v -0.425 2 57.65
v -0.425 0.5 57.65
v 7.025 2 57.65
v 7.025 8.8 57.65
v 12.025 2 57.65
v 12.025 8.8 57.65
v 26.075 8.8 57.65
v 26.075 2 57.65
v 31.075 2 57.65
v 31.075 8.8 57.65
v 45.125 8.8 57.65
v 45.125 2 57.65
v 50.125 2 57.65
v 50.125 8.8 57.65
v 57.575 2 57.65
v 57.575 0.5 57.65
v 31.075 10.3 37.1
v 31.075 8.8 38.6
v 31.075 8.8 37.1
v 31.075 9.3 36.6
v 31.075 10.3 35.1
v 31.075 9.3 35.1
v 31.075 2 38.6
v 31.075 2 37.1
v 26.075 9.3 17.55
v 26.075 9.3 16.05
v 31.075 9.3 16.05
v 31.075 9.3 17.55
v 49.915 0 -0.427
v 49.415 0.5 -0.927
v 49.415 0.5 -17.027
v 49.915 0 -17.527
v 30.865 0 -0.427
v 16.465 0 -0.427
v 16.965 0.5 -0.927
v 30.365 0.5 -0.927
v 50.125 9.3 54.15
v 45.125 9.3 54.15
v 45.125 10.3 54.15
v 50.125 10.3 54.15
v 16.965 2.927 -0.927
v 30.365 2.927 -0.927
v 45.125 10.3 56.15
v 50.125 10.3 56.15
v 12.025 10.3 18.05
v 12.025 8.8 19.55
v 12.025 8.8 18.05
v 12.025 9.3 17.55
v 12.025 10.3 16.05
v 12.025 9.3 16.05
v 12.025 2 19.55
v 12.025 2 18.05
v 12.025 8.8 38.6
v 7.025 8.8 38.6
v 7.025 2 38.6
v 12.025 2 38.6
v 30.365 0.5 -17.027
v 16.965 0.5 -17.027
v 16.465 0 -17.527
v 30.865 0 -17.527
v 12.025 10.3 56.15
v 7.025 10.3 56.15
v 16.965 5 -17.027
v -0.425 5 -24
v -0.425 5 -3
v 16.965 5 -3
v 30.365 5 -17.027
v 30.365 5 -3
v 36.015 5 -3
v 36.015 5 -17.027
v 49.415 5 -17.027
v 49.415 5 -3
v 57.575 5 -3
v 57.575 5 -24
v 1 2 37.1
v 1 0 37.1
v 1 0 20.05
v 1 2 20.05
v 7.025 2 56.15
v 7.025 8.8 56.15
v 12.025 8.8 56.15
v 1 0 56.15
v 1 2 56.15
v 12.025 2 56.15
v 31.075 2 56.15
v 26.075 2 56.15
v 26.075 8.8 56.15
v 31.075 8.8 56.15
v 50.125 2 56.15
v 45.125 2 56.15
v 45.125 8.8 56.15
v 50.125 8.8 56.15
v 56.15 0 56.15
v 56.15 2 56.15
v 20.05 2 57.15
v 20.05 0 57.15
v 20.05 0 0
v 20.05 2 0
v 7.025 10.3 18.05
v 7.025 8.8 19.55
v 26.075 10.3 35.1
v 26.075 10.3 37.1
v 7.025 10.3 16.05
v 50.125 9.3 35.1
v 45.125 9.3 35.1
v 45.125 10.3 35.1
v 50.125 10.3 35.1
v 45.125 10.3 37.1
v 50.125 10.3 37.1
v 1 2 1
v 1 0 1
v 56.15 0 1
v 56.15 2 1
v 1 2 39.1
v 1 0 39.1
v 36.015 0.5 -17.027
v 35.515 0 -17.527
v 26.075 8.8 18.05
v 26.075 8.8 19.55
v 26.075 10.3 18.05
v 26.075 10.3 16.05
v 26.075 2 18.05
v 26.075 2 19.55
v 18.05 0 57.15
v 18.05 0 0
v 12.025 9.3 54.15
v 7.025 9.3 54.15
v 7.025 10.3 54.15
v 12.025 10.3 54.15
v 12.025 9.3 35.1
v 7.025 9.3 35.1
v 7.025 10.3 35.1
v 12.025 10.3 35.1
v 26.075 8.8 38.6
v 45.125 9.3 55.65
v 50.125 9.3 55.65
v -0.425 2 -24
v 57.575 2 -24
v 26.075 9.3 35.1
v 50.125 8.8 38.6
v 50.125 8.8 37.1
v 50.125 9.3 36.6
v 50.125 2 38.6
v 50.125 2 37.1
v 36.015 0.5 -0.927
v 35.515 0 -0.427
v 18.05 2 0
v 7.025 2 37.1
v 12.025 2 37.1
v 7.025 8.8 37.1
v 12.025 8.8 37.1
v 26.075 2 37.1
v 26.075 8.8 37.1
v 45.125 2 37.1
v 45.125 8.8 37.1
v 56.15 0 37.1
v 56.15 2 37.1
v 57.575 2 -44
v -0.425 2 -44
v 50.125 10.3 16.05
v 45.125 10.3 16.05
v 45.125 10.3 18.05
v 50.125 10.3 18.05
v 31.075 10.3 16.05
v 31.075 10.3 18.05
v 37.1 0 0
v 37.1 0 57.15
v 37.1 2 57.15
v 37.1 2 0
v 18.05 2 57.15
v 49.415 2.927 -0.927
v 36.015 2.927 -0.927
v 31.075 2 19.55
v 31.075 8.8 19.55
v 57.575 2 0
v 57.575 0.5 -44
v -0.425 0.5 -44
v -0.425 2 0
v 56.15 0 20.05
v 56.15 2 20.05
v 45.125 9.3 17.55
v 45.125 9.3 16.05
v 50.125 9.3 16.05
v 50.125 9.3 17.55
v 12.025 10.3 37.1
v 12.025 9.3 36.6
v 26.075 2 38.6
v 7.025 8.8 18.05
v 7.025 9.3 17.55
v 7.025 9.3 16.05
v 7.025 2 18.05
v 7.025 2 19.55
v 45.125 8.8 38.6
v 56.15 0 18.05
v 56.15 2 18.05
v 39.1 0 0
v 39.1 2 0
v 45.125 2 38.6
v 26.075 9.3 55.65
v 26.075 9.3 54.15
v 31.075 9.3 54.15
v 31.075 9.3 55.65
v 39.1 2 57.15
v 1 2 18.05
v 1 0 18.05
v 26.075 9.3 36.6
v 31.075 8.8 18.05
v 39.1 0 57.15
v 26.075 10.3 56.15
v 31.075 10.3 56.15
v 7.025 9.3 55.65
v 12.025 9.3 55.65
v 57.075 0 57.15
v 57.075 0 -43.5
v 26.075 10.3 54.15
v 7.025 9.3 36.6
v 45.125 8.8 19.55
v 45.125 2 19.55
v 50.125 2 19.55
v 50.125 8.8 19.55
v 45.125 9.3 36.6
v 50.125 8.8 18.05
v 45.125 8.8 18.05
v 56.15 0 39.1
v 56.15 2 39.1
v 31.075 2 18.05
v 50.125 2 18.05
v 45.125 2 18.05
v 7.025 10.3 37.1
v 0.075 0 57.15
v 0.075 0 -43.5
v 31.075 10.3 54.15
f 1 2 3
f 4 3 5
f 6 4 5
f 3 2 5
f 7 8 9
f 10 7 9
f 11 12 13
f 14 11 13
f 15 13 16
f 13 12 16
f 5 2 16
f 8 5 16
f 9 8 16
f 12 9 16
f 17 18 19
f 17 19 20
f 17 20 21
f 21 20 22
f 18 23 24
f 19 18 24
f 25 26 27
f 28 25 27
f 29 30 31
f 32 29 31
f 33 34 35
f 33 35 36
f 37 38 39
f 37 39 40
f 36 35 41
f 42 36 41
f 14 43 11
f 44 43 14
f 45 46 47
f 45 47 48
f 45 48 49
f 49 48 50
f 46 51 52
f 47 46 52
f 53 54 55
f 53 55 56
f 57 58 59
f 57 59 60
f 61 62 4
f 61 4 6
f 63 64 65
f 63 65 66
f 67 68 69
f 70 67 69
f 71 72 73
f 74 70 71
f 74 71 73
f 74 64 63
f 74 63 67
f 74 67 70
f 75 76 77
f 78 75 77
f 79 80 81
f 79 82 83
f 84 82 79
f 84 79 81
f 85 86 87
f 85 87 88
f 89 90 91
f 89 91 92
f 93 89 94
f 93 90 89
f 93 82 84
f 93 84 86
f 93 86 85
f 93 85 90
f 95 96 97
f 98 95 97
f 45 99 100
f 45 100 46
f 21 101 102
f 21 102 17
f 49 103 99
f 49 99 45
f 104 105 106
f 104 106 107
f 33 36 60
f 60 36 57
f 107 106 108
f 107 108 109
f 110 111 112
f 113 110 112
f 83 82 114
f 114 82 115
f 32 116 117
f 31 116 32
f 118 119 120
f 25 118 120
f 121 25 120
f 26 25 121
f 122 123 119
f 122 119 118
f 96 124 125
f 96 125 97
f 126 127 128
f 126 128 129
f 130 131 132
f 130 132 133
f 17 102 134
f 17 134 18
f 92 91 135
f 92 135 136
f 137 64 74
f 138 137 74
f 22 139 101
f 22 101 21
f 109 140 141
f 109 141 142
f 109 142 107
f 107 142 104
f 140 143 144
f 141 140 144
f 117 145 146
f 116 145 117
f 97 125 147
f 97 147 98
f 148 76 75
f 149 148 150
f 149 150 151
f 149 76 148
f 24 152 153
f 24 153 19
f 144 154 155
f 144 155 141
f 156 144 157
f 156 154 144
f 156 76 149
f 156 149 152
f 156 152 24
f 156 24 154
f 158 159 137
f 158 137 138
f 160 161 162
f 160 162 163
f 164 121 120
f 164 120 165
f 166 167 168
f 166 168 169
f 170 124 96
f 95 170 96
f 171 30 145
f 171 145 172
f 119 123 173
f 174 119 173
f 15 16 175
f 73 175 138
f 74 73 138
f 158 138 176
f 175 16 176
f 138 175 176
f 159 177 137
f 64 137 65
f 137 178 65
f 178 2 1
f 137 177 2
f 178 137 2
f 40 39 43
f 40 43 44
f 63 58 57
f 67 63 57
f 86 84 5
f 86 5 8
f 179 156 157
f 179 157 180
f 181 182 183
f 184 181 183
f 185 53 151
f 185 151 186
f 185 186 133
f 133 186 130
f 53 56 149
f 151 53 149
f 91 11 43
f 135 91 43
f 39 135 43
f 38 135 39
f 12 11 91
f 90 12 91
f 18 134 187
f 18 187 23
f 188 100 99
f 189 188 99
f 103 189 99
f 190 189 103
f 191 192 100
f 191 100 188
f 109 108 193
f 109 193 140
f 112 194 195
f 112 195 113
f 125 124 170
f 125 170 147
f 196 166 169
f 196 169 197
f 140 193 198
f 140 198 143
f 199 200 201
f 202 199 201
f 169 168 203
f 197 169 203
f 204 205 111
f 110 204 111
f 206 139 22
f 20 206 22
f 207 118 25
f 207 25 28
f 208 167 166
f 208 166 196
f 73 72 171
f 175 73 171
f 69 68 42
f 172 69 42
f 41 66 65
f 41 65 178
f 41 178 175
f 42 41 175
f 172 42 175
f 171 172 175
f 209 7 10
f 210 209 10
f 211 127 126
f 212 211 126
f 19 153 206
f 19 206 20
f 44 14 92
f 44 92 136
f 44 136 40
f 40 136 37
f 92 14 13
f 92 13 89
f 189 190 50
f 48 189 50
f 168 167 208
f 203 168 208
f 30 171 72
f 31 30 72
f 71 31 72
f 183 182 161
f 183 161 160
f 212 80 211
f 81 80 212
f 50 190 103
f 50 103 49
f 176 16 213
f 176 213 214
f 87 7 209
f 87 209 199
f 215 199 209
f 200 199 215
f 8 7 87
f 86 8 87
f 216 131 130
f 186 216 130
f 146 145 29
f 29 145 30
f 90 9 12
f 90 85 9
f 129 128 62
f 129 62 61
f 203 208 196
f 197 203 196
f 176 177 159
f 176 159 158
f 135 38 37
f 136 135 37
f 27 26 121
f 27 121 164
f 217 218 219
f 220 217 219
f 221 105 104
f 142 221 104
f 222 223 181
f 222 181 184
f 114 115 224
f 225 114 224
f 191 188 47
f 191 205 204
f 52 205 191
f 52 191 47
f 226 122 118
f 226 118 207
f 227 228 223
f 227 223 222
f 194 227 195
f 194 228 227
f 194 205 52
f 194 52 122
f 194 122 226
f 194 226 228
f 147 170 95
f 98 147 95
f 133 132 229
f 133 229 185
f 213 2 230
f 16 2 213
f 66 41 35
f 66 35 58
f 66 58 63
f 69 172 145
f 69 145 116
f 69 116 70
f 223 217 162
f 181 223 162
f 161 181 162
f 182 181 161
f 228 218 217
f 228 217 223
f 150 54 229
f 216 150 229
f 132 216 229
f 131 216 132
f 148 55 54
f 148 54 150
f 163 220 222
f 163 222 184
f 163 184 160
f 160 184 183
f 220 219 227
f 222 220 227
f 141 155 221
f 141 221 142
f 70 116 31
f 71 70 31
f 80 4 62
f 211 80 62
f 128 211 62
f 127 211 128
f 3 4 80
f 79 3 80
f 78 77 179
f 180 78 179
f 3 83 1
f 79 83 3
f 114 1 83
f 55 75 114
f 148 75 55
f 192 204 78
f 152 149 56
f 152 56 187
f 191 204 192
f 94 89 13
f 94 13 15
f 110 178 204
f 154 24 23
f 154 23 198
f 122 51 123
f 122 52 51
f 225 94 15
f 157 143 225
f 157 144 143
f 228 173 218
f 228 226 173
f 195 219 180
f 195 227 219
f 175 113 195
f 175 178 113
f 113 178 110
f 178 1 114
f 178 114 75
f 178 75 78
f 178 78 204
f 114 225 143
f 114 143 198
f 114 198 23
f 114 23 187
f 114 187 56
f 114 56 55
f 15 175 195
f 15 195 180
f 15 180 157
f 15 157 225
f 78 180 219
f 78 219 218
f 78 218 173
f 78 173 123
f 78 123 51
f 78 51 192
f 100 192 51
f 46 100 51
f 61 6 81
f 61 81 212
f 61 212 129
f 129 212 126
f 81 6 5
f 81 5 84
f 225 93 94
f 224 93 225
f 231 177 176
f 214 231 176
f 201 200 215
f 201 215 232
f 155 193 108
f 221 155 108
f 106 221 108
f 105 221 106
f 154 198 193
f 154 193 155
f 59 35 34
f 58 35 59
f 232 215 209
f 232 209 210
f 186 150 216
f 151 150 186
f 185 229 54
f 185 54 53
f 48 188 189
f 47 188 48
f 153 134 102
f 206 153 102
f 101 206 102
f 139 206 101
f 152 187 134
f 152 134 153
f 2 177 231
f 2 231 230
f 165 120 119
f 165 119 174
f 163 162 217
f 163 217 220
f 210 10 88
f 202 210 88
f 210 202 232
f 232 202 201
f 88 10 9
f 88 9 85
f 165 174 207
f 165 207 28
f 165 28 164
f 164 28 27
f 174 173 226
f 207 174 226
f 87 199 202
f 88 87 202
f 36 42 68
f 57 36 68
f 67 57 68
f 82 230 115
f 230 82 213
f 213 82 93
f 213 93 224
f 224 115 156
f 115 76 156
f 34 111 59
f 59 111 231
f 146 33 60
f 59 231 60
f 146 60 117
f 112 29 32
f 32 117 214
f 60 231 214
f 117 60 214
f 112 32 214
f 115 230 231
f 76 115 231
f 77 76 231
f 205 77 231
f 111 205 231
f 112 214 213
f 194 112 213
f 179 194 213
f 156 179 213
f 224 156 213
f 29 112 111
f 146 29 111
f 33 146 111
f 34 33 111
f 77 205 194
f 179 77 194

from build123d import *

# Parameters (mm, degrees)
SKETCH1_W             = 2
SKETCH1_H             = 57.15
EXTRUDE_THIN1_DEPTH   = 2
SKETCH1_W_2           = 59.15
SKETCH1_H_2           = 59.15
SKETCH1_W_3           = 55.15
SKETCH1_H_3           = 55.15
EXTRUDE_THIN1_2_DEPTH = 2
EXTRUDE_THIN1_3_DEPTH = 2
SKETCH1_W_4           = 57.15
SKETCH1_H_4           = 2
EXTRUDE_THIN1_4_DEPTH = 2
EXTRUDE_THIN1_5_DEPTH = 2
BOSS_EXTRUDE1_START   = 2
SKETCH2_W             = 5
SKETCH2_H             = 1.5
BOSS_EXTRUDE1_DEPTH   = 7.3
BOSS_EXTRUDE2_START   = 9.3
SKETCH3_W             = 5
SKETCH3_H             = 3.5
BOSS_EXTRUDE2_DEPTH   = 1
CHAMFER1_SIZE         = 0.5
CHAMFER2_SIZE         = 1.5
SKETCH4_W             = 58
SKETCH4_H             = 43
BOSS_EXTRUDE3_DEPTH   = 5
CHAMFER3_SIZE         = 2
SKETCH5_W             = 13.4
SKETCH5_H             = 16.1
CUT_EXTRUDE1_DEPTH    = 83.879038363
CHAMFER4_START        = -0.425
CHAMFER4_DEPTH        = 58.575
CHAMFER4_2_DEPTH      = 17.39
CHAMFER4_START_2      = 49.415
CHAMFER4_3_DEPTH      = 8.735
CHAMFER4_START_3      = 30.365
CHAMFER4_4_DEPTH      = 5.65
CUT_EXTRUDE2_START    = 5
SKETCH6_W             = 58
SKETCH6_H             = 20
CUT_EXTRUDE2_DEPTH    = 3
CUT_EXTRUDE3_DEPTH    = 83.879038363
CHAMFER5_SIZE         = 0.5


with BuildPart() as part:
    # Sketch1 → Extrude-Thin1 (new body)
    with BuildSketch(Plane(origin=(0, 0, 0), x_dir=(1, 0, 0), z_dir=(0, 1, 0))):
        with Locations((38.1, -28.575)):
            Rectangle(SKETCH1_W, SKETCH1_H)
    extrude(amount=EXTRUDE_THIN1_DEPTH)


with BuildPart() as body_2:
    # Sketch1 → Extrude-Thin1 2 (new body)
    with BuildSketch(Plane(origin=(0, 0, 0), x_dir=(1, 0, 0), z_dir=(0, 1, 0))):
        with Locations((28.575, -28.575)):
            Rectangle(SKETCH1_W_2, SKETCH1_H_2)
        with Locations((28.575, -28.575)):
            Rectangle(SKETCH1_W_3, SKETCH1_H_3, mode=Mode.SUBTRACT)
    extrude(amount=EXTRUDE_THIN1_2_DEPTH)



with BuildPart() as body_3:
    # Sketch1 → Extrude-Thin1 3 (new body)
    with BuildSketch(Plane(origin=(0, 0, 0), x_dir=(1, 0, 0), z_dir=(0, 1, 0))):
        with Locations((19.05, -28.575)):
            Rectangle(SKETCH1_W, SKETCH1_H)
    extrude(amount=EXTRUDE_THIN1_3_DEPTH)


with BuildPart() as body_4:
    # Sketch1 → Extrude-Thin1 4 (new body)
    with BuildSketch(Plane(origin=(0, 0, 0), x_dir=(1, 0, 0), z_dir=(0, 1, 0))):
        with Locations((28.575, -38.1)):
            Rectangle(SKETCH1_W_4, SKETCH1_H_4)
    extrude(amount=EXTRUDE_THIN1_4_DEPTH)


with BuildPart() as body_5:
    # Sketch1 → Extrude-Thin1 5 (new body)
    with BuildSketch(Plane(origin=(0, 0, 0), x_dir=(1, 0, 0), z_dir=(0, 1, 0))):
        with Locations((28.575, -19.05)):
            Rectangle(SKETCH1_W_4, SKETCH1_H_4)
    extrude(amount=EXTRUDE_THIN1_5_DEPTH)


with BuildPart() as body_2_1:
    add(body_2.part)

    add(body_4.part)  # Boss-Extrude1 merges body 4

    add(body_5.part)  # Boss-Extrude1 merges body 5
    # Sketch2 → Boss-Extrude1 (add)
    with BuildSketch(Plane(origin=(0, 0, 0), x_dir=(1, 0, 0), z_dir=(0, 1, 0)).offset(BOSS_EXTRUDE1_START)):
        with Locations((28.575, -56.9)):
            Rectangle(SKETCH2_W, SKETCH2_H)
        with Locations((9.525, -56.9)):
            Rectangle(SKETCH2_W, SKETCH2_H)
        with Locations((47.625, -56.9)):
            Rectangle(SKETCH2_W, SKETCH2_H)
        with Locations((28.575, -37.85)):
            Rectangle(SKETCH2_W, SKETCH2_H)
        with Locations((47.625, -37.85)):
            Rectangle(SKETCH2_W, SKETCH2_H)
        with Locations((28.575, -18.8)):
            Rectangle(SKETCH2_W, SKETCH2_H)
        with Locations((47.625, -18.8)):
            Rectangle(SKETCH2_W, SKETCH2_H)
        with Locations((9.525, -37.85)):
            Rectangle(SKETCH2_W, SKETCH2_H)
        with Locations((9.525, -18.8)):
            Rectangle(SKETCH2_W, SKETCH2_H)
    extrude(amount=BOSS_EXTRUDE1_DEPTH)

    # Sketch3 → Boss-Extrude2 (add)
    with BuildSketch(Plane(origin=(0, 0, 0), x_dir=(1, 0, 0), z_dir=(0, 1, 0)).offset(BOSS_EXTRUDE2_START)):
        with Locations((28.575, -55.9)):
            Rectangle(SKETCH3_W, SKETCH3_H)
        with Locations((9.525, -55.9)):
            Rectangle(SKETCH3_W, SKETCH3_H)
        with Locations((47.625, -55.9)):
            Rectangle(SKETCH3_W, SKETCH3_H)
        with Locations((28.575, -36.85)):
            Rectangle(SKETCH3_W, SKETCH3_H)
        with Locations((47.625, -36.85)):
            Rectangle(SKETCH3_W, SKETCH3_H)
        with Locations((28.575, -17.8)):
            Rectangle(SKETCH3_W, SKETCH3_H)
        with Locations((47.625, -17.8)):
            Rectangle(SKETCH3_W, SKETCH3_H)
        with Locations((9.525, -36.85)):
            Rectangle(SKETCH3_W, SKETCH3_H)
        with Locations((9.525, -17.8)):
            Rectangle(SKETCH3_W, SKETCH3_H)
    extrude(amount=BOSS_EXTRUDE2_DEPTH)

    # Chamfer1
    chamfer1_edges = [body_2_1.edges().sort_by_distance(p)[0] for p in [
        (28.575, 9.3, 56.15),
        (47.625, 9.3, 56.15),
        (47.625, 9.3, 37.1),
        (28.575, 9.3, 18.05),
        (47.625, 9.3, 18.05),
        (9.525, 9.3, 37.1),
        (28.575, 9.3, 37.1),
        (9.525, 9.3, 18.05),
        (9.525, 9.3, 56.15),
    ]]
    chamfer(chamfer1_edges, length=CHAMFER1_SIZE)

    # Chamfer2
    chamfer2_edges = [body_2_1.edges().sort_by_distance(p)[0] for p in [
        (28.575, 10.3, 57.65),
        (47.625, 10.3, 57.65),
        (28.575, 10.3, 38.6),
        (47.625, 10.3, 38.6),
        (28.575, 10.3, 19.55),
        (47.625, 10.3, 19.55),
        (9.525, 10.3, 38.6),
        (9.525, 10.3, 19.55),
        (9.525, 10.3, 57.65),
    ]]
    chamfer(chamfer2_edges, length=CHAMFER2_SIZE)

    # Sketch4 → Boss-Extrude3 (add)
    with BuildSketch(Plane(origin=(0, 0, 0), x_dir=(1, 0, 0), z_dir=(0, 1, 0))):
        with Locations((28.575, 22.5)):
            Rectangle(SKETCH4_W, SKETCH4_H)
    extrude(amount=BOSS_EXTRUDE3_DEPTH)

    # Chamfer3
    chamfer3_edges = [body_2_1.edges().sort_by_distance(p)[0] for p in [
        (28.575, 5, -1),
    ]]
    chamfer(chamfer3_edges, length=CHAMFER3_SIZE)

    # Sketch5 → Cut-Extrude1 (cut, through all)
    with BuildSketch(Plane(origin=(0, 0, 0), x_dir=(1, 0, 0), z_dir=(0, 1, 0))):
        with Locations((23.665, 8.977)):
            Rectangle(SKETCH5_W, SKETCH5_H)
        with Locations((42.715, 8.977)):
            Rectangle(SKETCH5_W, SKETCH5_H)
    extrude(amount=CUT_EXTRUDE1_DEPTH, mode=Mode.SUBTRACT)

    # Chamfer4: read off the stored shape, not the designer's step
    # Chamfer4 outline → Chamfer4 (add)
    with BuildSketch(Plane.YZ.offset(CHAMFER4_START)):
        Polygon((2, -0.927), (2.927, -0.927), (2, 0), align=None)
    extrude(amount=CHAMFER4_DEPTH)

    # Chamfer4 2 outline → Chamfer4 2 (add)
    with BuildSketch(Plane.YZ.offset(CHAMFER4_START)):
        Polygon((2, -1), (3, -1), (2.927, -0.927), (2, -0.927), align=None)
    extrude(amount=CHAMFER4_2_DEPTH)

    # Chamfer4 3 outline → Chamfer4 3 (add)
    with BuildSketch(Plane.YZ.offset(CHAMFER4_START_2)):
        Polygon((2, -1), (3, -1), (2.927, -0.927), (2, -0.927), align=None)
    extrude(amount=CHAMFER4_3_DEPTH)

    # Chamfer4 4 outline → Chamfer4 4 (add)
    with BuildSketch(Plane.YZ.offset(CHAMFER4_START_3)):
        Polygon((2, -1), (3, -1), (2.927, -0.927), (2, -0.927), align=None)
    extrude(amount=CHAMFER4_4_DEPTH)

    # Sketch6 → Cut-Extrude2 (cut)
    with BuildSketch(Plane(origin=(0, 0, 0), x_dir=(1, 0, 0), z_dir=(0, 1, 0)).offset(CUT_EXTRUDE2_START)):
        with Locations((28.575, 34)):
            Rectangle(SKETCH6_W, SKETCH6_H)
    extrude(amount=-CUT_EXTRUDE2_DEPTH, mode=Mode.SUBTRACT)

    # Sketch7 → Cut-Extrude3 (cut, through all)
    with BuildSketch(Plane(origin=(0, 0, 0), x_dir=(1, 0, 0), z_dir=(0, 1, 0))):
        Polygon((57.575, 1), (58.15, 1), (58.15, 0), (58.15, -58.15), (-1, -58.15), (-1, 1), (-0.425, 1), (-0.425, -57.65), (57.575, -57.65), align=None)
    extrude(amount=CUT_EXTRUDE3_DEPTH, mode=Mode.SUBTRACT)

    # Chamfer5
    chamfer5_edges = [body_2_1.edges().sort_by_distance(p)[0] for p in [
        (-0.425, 0, 6.825),
        (57.575, 0, 6.825),
        (28.575, 0, -44),
        (23.665, 0, -0.927),
        (23.665, 0, -17.027),
        (16.965, 0, -8.977),
        (30.365, 0, -8.977),
        (42.715, 0, -0.927),
        (42.715, 0, -17.027),
        (36.015, 0, -8.977),
        (49.415, 0, -8.977),
        (28.575, 0, 57.65),
    ]]
    chamfer(chamfer5_edges, length=CHAMFER5_SIZE)


solid = Compound([part.part, body_3.part, body_2_1.part])
